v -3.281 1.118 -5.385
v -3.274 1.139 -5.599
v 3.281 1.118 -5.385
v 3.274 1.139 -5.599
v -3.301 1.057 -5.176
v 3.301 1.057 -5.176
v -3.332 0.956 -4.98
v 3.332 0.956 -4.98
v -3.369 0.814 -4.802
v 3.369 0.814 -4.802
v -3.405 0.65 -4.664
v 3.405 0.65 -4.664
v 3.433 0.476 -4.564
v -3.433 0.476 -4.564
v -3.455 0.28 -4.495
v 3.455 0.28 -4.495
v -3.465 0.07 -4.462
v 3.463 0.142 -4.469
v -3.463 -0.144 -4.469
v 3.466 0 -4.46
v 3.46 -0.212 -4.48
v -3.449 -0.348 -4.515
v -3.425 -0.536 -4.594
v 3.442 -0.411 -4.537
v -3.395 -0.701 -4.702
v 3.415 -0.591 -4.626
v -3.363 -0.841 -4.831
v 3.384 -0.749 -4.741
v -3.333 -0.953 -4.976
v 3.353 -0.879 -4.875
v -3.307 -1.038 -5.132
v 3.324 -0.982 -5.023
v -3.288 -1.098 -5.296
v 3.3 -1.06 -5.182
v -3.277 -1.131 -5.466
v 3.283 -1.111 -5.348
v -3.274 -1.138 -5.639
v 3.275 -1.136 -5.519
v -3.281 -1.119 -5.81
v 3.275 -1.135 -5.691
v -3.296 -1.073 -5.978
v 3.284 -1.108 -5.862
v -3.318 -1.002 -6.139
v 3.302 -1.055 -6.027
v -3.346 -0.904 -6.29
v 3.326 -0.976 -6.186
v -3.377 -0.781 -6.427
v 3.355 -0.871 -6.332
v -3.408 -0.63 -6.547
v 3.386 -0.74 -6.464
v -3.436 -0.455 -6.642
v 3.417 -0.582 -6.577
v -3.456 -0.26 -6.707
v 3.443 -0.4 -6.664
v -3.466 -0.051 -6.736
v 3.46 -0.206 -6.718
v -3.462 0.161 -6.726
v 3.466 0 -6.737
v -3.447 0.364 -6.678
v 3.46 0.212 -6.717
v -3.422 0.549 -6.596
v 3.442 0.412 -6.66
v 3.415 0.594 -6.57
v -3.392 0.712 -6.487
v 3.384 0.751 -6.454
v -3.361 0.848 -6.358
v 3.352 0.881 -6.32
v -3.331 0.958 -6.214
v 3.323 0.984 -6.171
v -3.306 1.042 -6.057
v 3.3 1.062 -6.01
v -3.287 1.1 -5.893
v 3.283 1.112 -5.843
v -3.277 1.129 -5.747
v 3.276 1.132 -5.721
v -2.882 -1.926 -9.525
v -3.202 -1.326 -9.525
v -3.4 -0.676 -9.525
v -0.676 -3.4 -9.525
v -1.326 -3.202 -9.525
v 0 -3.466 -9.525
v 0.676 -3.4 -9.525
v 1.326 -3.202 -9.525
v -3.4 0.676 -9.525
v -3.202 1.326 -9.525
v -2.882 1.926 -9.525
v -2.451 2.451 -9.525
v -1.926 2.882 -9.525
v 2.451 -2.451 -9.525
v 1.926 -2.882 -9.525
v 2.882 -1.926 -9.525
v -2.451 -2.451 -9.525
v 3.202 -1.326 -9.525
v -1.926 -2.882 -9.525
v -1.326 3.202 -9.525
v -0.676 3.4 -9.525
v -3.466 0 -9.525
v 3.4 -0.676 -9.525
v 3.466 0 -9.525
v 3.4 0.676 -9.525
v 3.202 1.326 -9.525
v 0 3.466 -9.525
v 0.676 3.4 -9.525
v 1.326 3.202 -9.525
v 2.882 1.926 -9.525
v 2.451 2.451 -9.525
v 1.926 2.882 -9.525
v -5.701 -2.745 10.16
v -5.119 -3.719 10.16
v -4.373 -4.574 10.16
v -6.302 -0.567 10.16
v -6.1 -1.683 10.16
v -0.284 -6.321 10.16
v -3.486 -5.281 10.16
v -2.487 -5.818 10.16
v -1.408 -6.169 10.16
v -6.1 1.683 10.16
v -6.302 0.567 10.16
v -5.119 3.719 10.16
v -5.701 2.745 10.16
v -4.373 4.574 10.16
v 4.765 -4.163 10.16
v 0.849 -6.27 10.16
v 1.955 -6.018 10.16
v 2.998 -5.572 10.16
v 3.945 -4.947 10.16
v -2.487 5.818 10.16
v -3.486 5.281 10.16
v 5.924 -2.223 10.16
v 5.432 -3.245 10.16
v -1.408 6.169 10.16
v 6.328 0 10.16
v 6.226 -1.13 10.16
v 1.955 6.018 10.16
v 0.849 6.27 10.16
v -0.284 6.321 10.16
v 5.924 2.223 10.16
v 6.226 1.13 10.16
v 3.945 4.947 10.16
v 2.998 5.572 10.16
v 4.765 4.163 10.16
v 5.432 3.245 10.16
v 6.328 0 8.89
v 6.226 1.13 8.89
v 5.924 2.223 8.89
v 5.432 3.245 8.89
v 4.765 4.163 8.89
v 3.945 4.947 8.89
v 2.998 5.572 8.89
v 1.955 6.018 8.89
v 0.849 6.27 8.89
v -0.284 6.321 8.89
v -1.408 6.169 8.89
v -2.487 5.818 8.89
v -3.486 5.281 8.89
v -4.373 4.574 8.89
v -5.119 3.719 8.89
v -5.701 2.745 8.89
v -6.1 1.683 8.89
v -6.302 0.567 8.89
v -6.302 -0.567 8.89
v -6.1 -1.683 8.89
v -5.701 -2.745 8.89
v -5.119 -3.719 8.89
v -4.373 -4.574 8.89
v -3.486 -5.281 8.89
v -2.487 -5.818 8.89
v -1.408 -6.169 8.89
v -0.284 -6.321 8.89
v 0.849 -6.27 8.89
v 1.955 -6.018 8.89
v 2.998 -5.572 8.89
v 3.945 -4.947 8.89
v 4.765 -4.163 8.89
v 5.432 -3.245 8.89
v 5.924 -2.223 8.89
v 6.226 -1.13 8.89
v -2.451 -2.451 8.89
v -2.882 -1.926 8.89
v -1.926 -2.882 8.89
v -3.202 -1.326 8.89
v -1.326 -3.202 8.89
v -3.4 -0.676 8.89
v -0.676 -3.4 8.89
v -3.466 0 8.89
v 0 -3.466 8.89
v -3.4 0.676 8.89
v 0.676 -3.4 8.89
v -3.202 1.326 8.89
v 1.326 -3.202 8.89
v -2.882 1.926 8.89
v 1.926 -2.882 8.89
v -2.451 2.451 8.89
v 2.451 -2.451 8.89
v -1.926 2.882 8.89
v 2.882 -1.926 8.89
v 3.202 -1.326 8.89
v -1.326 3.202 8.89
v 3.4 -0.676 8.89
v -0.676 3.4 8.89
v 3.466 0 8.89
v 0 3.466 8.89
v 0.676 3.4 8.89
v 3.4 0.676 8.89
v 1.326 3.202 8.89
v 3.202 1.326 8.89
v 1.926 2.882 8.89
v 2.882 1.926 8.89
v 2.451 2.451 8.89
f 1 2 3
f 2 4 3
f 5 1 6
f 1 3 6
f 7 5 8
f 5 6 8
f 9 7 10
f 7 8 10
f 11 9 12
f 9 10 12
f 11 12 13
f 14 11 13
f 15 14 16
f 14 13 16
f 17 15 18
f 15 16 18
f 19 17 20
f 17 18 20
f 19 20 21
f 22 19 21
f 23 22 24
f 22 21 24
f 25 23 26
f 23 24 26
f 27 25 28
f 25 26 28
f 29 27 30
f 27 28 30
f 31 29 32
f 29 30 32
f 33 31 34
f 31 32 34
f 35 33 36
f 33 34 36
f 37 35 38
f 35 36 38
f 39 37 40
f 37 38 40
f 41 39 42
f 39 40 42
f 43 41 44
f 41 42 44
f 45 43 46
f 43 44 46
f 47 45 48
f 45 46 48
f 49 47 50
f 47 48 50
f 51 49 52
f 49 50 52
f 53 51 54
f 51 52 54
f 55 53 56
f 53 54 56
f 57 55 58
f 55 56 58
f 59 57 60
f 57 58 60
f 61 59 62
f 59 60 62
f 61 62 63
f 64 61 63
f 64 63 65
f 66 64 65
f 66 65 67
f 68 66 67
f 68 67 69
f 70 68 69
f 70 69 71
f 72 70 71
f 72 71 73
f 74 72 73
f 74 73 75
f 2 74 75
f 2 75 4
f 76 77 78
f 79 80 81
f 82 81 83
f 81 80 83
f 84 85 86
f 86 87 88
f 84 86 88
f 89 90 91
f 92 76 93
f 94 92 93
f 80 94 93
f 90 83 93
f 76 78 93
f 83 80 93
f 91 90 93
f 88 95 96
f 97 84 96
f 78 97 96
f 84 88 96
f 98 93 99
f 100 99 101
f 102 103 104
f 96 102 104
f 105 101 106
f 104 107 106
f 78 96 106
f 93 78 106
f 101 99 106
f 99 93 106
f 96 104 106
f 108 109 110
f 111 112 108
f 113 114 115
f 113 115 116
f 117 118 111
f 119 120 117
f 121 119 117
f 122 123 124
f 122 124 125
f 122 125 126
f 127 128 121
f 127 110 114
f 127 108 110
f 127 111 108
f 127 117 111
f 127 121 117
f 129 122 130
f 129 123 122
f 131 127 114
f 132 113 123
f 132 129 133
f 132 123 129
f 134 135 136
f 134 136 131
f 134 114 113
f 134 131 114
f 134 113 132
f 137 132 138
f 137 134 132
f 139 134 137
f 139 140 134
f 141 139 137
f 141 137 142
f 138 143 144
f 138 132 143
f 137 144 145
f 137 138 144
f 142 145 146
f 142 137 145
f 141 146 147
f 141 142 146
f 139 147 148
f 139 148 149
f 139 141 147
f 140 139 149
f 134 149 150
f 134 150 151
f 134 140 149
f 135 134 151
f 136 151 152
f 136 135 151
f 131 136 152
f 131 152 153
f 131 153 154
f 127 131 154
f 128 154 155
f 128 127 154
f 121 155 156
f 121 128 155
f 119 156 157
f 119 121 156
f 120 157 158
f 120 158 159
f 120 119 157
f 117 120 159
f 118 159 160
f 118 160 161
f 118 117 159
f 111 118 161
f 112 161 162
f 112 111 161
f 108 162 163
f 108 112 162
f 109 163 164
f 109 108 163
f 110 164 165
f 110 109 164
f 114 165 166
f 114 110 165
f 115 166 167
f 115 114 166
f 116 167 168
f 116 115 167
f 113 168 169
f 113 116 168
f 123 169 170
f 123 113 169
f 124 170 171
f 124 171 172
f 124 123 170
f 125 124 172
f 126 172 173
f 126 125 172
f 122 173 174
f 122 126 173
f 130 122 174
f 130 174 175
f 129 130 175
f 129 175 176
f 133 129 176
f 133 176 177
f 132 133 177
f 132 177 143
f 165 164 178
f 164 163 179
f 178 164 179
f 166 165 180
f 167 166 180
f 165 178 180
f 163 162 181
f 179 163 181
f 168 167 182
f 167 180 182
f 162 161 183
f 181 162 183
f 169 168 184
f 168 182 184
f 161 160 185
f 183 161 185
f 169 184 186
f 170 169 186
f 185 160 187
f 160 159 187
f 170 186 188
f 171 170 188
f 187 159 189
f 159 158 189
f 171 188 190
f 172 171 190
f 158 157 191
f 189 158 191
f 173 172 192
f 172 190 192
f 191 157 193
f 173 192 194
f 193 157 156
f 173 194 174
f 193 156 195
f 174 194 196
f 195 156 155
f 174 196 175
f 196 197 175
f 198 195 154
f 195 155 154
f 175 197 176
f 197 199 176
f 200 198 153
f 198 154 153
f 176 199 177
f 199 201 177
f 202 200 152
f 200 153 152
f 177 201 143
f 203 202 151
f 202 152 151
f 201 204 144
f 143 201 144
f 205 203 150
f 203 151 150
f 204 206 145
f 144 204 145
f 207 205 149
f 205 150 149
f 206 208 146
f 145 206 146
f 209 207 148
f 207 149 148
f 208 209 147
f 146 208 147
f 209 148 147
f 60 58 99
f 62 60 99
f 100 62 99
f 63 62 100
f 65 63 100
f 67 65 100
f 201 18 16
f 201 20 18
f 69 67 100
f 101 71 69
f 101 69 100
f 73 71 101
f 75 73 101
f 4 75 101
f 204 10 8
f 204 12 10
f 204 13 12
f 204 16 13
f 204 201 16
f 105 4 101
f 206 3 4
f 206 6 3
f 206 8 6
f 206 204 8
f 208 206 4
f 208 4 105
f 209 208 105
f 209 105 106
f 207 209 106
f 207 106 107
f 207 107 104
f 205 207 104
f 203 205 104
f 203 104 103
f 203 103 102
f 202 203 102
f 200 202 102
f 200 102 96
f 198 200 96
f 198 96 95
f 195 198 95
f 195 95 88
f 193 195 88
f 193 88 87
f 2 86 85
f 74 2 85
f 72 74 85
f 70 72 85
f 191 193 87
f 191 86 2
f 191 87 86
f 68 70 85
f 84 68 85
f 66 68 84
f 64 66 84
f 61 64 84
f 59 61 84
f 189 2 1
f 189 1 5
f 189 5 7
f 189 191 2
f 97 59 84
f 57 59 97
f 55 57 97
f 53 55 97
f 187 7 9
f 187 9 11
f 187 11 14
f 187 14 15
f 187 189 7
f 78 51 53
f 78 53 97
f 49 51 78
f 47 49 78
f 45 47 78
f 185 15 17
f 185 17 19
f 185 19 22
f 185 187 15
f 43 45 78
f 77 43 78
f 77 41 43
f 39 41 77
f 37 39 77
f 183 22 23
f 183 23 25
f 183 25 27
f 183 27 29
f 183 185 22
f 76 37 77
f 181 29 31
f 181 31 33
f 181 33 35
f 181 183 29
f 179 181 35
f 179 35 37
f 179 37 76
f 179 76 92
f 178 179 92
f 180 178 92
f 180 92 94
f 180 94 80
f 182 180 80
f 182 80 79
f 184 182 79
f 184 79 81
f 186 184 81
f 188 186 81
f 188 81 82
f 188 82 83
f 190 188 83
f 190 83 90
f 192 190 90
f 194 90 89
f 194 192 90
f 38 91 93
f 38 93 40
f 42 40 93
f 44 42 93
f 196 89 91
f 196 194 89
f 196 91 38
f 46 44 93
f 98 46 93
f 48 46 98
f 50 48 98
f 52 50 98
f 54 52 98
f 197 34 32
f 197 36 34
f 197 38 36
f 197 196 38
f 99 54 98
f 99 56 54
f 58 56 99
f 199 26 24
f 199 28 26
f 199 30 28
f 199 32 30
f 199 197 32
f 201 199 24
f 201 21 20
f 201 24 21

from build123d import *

# Parameters (mm, degrees)
F0_R     = 3.466188
F1_DEPTH = 9.525
F2_R     = 6.327639
F3_DEPTH = 0.635
F4_R     = 1.138516
F5_DEPTH = 12.7


with BuildPart() as f1:
    # F0 (on Top) → F1 (new body, symmetric)
    with BuildSketch(Plane.XY):
        Circle(F0_R)
    extrude(amount=F1_DEPTH, both=True)

    # F2 (on face) → F3 (join, symmetric)
    with BuildSketch(Plane.XY.offset(9.525)):
        Circle(F2_R)
    extrude(amount=F3_DEPTH, both=True)

    # F4 (on Right) → F5 (cut, symmetric)
    with BuildSketch(Plane.YZ):
        with Locations((0, -5.598677)):
            Circle(F4_R)
    extrude(amount=F5_DEPTH, both=True, mode=Mode.SUBTRACT)


solid = f1.part
